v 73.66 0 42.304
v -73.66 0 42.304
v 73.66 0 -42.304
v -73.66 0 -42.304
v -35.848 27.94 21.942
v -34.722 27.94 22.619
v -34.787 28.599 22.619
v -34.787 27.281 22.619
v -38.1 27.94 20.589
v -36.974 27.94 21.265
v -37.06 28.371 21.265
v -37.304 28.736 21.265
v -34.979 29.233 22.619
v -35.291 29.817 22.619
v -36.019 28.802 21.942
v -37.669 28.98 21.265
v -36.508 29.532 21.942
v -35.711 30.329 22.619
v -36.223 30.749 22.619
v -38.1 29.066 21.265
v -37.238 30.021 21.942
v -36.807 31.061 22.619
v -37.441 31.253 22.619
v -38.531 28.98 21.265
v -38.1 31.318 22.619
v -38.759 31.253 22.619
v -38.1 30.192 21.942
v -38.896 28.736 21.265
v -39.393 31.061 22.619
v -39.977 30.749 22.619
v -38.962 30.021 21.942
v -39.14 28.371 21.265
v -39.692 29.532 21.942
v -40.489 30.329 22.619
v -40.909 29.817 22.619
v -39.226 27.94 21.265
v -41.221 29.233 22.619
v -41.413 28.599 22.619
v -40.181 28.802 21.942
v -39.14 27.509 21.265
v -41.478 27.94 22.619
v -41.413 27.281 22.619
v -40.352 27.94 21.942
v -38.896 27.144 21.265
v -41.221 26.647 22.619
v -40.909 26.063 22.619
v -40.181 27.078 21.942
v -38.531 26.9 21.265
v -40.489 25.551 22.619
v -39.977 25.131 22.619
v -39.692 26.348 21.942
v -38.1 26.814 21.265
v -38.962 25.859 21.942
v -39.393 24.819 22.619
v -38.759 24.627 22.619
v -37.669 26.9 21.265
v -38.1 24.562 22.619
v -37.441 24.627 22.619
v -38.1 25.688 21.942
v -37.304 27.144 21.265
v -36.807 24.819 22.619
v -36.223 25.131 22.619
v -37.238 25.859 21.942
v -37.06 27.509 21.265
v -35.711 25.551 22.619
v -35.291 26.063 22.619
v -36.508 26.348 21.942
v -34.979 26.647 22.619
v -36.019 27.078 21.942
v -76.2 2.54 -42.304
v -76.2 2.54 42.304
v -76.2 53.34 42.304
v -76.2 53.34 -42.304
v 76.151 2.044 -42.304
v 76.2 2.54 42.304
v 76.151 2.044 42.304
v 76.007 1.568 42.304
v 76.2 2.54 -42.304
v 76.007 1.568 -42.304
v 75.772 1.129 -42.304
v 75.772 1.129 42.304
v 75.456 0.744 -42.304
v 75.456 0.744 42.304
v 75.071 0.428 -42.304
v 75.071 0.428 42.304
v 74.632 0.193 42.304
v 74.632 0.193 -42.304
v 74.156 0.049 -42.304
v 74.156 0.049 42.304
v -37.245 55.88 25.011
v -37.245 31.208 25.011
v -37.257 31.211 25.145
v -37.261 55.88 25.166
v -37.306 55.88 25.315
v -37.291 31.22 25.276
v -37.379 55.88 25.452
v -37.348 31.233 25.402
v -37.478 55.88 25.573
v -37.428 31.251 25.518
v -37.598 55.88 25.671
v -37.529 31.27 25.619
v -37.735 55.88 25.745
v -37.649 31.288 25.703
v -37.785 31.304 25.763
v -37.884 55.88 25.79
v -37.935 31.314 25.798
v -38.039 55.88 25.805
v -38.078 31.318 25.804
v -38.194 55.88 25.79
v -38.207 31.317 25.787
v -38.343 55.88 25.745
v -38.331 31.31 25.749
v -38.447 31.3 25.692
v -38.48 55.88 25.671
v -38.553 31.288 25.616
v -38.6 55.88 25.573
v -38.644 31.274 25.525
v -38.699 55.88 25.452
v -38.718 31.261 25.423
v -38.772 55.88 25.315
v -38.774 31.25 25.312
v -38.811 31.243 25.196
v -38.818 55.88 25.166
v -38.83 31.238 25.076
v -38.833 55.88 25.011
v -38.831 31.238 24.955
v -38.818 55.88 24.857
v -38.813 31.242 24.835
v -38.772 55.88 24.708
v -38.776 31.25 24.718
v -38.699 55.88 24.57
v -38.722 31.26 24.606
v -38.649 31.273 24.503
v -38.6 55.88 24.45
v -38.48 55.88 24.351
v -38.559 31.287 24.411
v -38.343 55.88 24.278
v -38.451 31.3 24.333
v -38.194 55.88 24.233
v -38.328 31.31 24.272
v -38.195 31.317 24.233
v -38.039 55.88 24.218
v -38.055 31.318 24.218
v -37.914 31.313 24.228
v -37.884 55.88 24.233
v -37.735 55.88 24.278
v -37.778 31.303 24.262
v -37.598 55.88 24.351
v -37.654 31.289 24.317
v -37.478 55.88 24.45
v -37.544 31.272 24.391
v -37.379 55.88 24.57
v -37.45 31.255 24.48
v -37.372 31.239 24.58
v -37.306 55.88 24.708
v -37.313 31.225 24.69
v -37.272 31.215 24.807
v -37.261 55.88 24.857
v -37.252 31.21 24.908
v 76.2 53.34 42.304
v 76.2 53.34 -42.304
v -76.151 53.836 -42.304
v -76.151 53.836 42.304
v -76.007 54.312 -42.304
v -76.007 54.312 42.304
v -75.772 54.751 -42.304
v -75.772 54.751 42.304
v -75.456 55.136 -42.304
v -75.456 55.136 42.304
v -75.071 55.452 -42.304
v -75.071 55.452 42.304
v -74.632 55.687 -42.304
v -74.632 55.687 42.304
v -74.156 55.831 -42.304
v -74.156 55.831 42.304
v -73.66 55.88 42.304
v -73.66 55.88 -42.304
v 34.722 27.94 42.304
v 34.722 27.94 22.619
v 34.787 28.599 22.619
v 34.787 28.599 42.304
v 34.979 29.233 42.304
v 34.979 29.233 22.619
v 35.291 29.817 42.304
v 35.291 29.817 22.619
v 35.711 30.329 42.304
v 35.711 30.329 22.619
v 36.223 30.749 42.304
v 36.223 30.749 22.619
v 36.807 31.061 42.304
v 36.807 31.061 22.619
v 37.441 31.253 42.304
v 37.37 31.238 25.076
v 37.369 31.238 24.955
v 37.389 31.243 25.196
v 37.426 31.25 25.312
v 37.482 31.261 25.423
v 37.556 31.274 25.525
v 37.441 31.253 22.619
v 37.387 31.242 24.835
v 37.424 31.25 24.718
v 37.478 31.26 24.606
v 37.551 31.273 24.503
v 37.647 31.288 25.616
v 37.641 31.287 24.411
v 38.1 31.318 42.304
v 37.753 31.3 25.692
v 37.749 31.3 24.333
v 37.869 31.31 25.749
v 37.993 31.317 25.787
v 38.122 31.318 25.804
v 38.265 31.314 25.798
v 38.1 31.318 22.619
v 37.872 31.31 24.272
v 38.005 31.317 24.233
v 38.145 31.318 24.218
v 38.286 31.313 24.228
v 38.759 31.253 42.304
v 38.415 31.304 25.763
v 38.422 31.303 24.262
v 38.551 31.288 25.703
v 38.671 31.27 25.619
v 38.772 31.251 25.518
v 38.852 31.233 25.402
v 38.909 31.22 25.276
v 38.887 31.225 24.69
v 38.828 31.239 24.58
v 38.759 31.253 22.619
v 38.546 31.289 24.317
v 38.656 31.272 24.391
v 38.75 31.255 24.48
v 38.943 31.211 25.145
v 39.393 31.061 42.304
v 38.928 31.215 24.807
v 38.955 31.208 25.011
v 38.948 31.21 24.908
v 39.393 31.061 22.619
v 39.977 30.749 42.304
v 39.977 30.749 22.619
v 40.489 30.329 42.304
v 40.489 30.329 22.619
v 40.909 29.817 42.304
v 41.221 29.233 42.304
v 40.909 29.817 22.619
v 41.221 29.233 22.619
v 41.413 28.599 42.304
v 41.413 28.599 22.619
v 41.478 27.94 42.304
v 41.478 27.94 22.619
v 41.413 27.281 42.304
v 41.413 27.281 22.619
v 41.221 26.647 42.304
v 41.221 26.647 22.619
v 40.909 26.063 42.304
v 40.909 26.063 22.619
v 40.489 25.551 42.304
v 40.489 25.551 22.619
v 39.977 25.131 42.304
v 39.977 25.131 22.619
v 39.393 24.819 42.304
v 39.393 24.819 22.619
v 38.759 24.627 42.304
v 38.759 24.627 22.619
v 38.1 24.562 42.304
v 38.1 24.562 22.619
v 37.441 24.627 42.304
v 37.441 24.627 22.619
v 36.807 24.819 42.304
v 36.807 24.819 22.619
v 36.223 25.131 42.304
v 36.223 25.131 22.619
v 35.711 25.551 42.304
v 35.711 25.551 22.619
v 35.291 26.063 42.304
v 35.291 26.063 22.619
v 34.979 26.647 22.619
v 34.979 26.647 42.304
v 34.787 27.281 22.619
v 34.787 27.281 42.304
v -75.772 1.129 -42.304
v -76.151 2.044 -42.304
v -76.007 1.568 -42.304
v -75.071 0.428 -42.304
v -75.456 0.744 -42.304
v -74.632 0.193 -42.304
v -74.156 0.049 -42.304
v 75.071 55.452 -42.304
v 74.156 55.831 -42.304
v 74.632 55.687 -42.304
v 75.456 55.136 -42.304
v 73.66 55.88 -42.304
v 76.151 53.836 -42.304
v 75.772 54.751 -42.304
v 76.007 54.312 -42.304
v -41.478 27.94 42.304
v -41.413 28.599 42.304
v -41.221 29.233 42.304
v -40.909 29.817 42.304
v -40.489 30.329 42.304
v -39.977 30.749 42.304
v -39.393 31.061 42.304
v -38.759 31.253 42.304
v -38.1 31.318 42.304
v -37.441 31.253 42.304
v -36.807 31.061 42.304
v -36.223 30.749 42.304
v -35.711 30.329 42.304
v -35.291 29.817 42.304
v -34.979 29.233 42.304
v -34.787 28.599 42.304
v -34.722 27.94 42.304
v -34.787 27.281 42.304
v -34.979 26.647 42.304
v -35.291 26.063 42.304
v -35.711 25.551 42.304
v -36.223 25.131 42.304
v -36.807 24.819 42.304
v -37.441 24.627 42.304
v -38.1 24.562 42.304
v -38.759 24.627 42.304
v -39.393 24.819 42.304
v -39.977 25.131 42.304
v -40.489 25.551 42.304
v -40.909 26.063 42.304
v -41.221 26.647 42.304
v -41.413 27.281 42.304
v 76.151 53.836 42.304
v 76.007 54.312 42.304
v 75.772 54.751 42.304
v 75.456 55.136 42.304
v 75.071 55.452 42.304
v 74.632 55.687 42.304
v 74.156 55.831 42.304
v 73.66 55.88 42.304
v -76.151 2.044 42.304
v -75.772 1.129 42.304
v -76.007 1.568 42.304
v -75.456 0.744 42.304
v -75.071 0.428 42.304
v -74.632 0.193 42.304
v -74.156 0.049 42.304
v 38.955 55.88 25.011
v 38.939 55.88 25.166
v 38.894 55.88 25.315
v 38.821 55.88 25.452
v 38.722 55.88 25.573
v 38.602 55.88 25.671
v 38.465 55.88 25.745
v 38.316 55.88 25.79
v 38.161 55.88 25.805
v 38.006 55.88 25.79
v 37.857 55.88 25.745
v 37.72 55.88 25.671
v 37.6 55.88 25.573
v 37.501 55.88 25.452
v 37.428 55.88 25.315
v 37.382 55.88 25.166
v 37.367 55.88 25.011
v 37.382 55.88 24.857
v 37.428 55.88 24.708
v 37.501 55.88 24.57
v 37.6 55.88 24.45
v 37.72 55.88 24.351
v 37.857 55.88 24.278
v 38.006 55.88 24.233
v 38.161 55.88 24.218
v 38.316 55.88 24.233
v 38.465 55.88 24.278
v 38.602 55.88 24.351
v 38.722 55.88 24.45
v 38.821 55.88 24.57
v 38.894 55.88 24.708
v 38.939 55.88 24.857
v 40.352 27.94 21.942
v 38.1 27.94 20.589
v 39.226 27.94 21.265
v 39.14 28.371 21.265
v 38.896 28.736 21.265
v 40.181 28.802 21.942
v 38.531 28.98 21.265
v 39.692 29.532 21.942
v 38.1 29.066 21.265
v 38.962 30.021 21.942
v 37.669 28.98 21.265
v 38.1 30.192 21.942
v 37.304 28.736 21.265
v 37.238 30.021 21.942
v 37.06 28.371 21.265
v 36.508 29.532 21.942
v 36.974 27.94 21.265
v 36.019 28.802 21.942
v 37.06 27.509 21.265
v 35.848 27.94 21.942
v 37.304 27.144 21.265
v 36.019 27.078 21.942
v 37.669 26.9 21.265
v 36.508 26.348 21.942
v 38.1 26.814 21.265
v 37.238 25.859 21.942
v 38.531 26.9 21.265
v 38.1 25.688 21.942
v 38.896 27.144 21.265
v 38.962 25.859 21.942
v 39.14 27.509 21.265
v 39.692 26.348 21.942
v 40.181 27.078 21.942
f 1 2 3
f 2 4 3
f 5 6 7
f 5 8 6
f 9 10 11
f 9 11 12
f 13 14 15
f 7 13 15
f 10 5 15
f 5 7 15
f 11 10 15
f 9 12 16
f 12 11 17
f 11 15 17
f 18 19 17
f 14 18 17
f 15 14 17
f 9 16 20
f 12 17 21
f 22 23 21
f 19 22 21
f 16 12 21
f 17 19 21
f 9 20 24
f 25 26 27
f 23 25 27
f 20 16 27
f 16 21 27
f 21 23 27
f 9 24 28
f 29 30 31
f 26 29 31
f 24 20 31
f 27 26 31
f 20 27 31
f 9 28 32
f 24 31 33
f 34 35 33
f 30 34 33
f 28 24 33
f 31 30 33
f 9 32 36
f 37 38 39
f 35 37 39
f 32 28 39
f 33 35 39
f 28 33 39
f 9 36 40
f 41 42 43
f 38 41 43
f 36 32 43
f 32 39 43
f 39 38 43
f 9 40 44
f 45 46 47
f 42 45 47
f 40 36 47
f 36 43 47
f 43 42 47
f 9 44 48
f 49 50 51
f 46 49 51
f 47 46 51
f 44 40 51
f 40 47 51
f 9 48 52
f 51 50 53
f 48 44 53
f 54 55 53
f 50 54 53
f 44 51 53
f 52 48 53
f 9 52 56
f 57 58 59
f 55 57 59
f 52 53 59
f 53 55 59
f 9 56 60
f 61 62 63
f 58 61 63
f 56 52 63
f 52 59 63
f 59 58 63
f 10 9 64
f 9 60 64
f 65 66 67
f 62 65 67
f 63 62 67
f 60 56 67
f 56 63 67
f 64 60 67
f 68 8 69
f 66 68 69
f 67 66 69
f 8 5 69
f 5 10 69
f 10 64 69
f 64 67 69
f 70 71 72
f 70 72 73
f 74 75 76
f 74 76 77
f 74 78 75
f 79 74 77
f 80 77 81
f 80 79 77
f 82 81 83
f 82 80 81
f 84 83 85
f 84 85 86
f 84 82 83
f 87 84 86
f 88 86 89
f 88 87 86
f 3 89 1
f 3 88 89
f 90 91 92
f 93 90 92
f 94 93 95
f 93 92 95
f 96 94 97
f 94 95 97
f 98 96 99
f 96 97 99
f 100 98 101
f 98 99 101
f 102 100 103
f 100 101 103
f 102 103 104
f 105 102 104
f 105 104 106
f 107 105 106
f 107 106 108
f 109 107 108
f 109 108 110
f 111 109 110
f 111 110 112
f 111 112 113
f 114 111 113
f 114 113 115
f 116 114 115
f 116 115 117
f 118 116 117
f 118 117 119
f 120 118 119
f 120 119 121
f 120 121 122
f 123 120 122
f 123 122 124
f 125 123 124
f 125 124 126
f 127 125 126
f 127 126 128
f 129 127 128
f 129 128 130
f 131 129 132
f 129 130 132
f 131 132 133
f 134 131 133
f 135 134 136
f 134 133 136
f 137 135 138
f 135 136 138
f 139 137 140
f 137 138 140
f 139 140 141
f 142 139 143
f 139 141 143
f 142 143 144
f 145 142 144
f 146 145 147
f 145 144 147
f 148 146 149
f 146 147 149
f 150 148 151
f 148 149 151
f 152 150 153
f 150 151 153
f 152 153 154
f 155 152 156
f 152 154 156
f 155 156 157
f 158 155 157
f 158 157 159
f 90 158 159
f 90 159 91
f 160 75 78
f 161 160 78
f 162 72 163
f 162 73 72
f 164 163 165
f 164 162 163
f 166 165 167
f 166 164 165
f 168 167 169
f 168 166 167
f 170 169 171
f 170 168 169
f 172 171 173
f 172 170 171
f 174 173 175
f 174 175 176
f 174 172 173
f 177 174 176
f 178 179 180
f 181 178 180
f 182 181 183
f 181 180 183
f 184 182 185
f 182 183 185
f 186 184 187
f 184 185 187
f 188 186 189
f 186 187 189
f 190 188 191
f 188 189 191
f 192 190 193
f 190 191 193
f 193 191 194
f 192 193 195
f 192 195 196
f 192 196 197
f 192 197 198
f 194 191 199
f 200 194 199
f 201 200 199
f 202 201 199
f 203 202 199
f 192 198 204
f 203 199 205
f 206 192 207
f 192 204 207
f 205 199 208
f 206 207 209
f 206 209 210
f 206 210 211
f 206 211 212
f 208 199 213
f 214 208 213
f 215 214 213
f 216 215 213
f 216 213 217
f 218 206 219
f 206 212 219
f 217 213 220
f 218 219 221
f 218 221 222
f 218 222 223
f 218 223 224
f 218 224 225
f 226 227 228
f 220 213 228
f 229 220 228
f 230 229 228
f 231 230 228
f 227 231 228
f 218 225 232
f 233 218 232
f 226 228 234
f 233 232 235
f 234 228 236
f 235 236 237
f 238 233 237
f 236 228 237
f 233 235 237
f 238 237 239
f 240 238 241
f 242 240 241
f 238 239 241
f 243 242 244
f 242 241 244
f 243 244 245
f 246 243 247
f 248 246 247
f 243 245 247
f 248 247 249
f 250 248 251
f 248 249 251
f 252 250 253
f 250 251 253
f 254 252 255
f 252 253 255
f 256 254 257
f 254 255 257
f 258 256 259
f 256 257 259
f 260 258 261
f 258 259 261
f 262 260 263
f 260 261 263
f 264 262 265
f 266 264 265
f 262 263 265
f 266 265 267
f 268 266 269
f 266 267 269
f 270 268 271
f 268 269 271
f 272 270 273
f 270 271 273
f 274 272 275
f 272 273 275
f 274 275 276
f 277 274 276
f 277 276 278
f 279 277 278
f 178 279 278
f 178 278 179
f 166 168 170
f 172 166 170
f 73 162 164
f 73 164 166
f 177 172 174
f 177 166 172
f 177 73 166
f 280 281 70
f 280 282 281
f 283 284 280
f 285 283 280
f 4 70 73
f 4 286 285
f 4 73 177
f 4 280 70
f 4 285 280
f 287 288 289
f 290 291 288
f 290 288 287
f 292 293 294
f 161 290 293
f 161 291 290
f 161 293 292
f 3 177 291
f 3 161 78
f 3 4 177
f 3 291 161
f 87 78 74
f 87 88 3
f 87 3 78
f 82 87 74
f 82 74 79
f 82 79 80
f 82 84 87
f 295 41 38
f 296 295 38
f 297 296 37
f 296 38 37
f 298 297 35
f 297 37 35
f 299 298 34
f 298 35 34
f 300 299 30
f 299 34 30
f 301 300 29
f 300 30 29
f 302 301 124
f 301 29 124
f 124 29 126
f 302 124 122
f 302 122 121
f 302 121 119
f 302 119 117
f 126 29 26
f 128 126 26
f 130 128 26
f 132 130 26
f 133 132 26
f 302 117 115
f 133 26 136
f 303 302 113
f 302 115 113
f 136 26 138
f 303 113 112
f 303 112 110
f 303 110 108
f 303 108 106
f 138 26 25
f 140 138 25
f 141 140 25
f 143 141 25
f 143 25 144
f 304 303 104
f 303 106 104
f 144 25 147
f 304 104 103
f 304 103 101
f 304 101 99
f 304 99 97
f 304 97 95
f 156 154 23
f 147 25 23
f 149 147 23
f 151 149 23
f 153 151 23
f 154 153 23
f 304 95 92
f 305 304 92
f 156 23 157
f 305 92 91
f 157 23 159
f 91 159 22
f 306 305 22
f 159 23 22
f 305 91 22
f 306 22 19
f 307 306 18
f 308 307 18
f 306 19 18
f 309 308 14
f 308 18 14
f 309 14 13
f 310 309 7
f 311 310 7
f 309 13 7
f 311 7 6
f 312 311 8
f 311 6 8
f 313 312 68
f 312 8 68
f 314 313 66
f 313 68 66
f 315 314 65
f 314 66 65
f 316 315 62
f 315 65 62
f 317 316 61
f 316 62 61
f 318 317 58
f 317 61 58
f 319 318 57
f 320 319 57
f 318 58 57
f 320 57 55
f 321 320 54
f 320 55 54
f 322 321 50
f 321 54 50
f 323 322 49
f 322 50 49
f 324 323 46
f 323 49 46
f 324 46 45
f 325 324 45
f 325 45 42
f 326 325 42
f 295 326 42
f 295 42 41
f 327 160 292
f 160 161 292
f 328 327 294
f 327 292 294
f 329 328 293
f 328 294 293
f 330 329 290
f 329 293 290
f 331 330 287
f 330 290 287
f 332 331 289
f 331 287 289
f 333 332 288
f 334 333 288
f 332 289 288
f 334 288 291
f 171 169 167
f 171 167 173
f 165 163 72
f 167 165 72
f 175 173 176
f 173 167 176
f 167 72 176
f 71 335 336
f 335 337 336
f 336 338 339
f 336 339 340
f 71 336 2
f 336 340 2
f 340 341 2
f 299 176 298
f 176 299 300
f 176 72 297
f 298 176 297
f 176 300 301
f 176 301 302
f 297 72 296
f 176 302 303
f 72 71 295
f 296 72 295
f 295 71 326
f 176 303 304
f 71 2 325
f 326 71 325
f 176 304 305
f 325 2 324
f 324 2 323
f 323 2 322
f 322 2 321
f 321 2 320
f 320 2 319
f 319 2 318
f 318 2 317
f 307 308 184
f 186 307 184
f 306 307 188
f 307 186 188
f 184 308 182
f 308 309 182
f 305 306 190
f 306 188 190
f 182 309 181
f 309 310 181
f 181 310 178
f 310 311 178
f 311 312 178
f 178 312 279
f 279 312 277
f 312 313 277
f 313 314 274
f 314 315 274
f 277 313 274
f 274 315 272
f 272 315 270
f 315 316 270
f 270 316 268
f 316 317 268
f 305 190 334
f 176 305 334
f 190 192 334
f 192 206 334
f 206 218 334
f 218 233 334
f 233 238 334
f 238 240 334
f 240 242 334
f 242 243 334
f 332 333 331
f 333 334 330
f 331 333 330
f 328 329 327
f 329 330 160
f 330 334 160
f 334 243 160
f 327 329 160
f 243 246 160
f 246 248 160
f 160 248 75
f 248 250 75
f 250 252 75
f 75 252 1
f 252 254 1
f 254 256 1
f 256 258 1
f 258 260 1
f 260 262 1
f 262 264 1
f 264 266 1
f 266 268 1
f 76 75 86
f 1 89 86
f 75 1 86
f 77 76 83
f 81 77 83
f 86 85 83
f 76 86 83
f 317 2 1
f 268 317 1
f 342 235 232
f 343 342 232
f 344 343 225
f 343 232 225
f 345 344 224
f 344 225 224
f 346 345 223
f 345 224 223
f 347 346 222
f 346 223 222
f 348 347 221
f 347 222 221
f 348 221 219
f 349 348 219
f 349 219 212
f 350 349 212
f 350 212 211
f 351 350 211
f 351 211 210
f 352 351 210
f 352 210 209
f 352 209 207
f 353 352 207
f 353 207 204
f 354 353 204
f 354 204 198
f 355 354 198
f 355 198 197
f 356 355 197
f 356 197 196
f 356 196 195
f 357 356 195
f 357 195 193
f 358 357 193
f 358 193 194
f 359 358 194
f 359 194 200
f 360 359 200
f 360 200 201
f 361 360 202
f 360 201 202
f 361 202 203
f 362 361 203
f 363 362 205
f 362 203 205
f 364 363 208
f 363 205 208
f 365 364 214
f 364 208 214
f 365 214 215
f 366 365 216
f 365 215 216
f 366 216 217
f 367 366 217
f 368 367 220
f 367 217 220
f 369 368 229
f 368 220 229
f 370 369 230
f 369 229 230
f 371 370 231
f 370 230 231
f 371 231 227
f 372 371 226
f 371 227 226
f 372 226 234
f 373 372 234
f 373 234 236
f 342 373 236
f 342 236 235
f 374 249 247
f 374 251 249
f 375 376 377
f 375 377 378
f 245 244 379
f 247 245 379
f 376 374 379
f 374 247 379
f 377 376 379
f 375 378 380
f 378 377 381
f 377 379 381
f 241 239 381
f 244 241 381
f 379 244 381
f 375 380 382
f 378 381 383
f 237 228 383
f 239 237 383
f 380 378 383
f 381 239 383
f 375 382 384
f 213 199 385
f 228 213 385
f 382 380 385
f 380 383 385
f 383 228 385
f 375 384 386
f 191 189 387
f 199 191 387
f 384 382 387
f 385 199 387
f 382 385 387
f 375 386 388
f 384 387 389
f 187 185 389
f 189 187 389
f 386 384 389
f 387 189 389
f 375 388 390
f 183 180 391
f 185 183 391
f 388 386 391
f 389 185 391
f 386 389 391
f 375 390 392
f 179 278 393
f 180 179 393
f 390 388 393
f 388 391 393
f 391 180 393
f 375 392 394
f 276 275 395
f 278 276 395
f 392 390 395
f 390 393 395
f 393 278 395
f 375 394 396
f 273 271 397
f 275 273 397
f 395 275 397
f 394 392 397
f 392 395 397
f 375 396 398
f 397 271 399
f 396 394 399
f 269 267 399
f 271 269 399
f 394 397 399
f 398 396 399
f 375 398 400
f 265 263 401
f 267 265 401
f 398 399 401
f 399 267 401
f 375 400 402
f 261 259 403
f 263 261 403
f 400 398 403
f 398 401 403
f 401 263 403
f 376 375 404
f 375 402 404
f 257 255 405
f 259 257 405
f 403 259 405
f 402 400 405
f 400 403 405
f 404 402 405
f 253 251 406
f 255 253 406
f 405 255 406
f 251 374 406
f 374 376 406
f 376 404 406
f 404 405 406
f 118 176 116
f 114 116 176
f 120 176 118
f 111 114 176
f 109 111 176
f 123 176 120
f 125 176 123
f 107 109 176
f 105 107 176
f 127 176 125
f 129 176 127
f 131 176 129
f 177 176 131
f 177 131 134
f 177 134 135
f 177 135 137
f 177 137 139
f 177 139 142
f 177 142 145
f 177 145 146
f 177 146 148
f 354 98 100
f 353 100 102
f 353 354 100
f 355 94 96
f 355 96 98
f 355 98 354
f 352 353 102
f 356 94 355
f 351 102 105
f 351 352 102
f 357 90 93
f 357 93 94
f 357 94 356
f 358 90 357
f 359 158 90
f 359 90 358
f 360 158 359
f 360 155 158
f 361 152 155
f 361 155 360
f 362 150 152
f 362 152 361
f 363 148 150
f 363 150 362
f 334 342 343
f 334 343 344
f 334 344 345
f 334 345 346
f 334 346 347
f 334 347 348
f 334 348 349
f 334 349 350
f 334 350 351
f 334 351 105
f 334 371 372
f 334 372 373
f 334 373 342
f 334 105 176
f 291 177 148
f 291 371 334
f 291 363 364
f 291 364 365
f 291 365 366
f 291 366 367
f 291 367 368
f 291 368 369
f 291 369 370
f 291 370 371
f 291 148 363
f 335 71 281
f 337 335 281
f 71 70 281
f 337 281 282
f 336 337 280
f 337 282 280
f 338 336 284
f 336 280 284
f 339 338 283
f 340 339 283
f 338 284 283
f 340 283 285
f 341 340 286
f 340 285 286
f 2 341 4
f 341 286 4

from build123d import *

# Parameters (mm, degrees)
SKETCH1_W                              = 152.4
SKETCH1_H                              = 84.6074
EXTRUDE1_DEPTH                         = 55.88
FILLET1_R                              = 2.54
TAPPED_HOLE_FOR_1_4_20_HELICOIL1_D     = 6.7564
TAPPED_HOLE_FOR_1_4_20_HELICOIL1_DEPTH = 19.685
TAPPED_HOLE_FOR_1_4_20_HELICOIL1_TIP   = 2.029827343
F_1_16_0_0625_DIAMETER_HOLE1_D         = 1.5875
F_1_16_0_0625_DIAMETER_HOLE1_DEPTH     = 27.94
F_1_16_0_0625_DIAMETER_HOLE1_TIP       = 0.476933116


with BuildPart() as part:
    # Sketch1 → Extrude1 (new body)
    with BuildSketch(Plane(origin=(0, 0, 0), x_dir=(1, 0, 0), z_dir=(0, 1, 0))):
        Rectangle(SKETCH1_W, SKETCH1_H)
    extrude(amount=EXTRUDE1_DEPTH)

    # Fillet1
    fillet1_edges = [part.edges().sort_by_distance(p)[0] for p in [
        (76.2, 55.88, 0),
        (-76.2, 55.88, 0),
        (76.2, 0, 0),
        (-76.2, 0, 0),
    ]]
    fillet(fillet1_edges, radius=FILLET1_R)

    # Tapped Hole for 1/4-20 Helicoil1
    with Locations(Plane.XY.offset(42.3037)):
        with Locations((-38.1, 27.94), (38.1, 27.94)):
            Hole(TAPPED_HOLE_FOR_1_4_20_HELICOIL1_D / 2, depth=TAPPED_HOLE_FOR_1_4_20_HELICOIL1_DEPTH)
            with Locations((0, 0, -(TAPPED_HOLE_FOR_1_4_20_HELICOIL1_DEPTH + TAPPED_HOLE_FOR_1_4_20_HELICOIL1_TIP / 2))):  # 118° drill point
                Cone(0, TAPPED_HOLE_FOR_1_4_20_HELICOIL1_D / 2, TAPPED_HOLE_FOR_1_4_20_HELICOIL1_TIP, mode=Mode.SUBTRACT)

    # 1/16 (0.0625) Diameter Hole1
    with Locations(Plane(origin=(0, 55.88, 0), x_dir=(-1, 0, 0), z_dir=(0, 1, 0))):
        with Locations((-38.160987939, 25.011375754), (38.039012061, 25.011375754)):
            Hole(F_1_16_0_0625_DIAMETER_HOLE1_D / 2, depth=F_1_16_0_0625_DIAMETER_HOLE1_DEPTH)
            with Locations((0, 0, -(F_1_16_0_0625_DIAMETER_HOLE1_DEPTH + F_1_16_0_0625_DIAMETER_HOLE1_TIP / 2))):  # 118° drill point
                Cone(0, F_1_16_0_0625_DIAMETER_HOLE1_D / 2, F_1_16_0_0625_DIAMETER_HOLE1_TIP, mode=Mode.SUBTRACT)


solid = part.part
